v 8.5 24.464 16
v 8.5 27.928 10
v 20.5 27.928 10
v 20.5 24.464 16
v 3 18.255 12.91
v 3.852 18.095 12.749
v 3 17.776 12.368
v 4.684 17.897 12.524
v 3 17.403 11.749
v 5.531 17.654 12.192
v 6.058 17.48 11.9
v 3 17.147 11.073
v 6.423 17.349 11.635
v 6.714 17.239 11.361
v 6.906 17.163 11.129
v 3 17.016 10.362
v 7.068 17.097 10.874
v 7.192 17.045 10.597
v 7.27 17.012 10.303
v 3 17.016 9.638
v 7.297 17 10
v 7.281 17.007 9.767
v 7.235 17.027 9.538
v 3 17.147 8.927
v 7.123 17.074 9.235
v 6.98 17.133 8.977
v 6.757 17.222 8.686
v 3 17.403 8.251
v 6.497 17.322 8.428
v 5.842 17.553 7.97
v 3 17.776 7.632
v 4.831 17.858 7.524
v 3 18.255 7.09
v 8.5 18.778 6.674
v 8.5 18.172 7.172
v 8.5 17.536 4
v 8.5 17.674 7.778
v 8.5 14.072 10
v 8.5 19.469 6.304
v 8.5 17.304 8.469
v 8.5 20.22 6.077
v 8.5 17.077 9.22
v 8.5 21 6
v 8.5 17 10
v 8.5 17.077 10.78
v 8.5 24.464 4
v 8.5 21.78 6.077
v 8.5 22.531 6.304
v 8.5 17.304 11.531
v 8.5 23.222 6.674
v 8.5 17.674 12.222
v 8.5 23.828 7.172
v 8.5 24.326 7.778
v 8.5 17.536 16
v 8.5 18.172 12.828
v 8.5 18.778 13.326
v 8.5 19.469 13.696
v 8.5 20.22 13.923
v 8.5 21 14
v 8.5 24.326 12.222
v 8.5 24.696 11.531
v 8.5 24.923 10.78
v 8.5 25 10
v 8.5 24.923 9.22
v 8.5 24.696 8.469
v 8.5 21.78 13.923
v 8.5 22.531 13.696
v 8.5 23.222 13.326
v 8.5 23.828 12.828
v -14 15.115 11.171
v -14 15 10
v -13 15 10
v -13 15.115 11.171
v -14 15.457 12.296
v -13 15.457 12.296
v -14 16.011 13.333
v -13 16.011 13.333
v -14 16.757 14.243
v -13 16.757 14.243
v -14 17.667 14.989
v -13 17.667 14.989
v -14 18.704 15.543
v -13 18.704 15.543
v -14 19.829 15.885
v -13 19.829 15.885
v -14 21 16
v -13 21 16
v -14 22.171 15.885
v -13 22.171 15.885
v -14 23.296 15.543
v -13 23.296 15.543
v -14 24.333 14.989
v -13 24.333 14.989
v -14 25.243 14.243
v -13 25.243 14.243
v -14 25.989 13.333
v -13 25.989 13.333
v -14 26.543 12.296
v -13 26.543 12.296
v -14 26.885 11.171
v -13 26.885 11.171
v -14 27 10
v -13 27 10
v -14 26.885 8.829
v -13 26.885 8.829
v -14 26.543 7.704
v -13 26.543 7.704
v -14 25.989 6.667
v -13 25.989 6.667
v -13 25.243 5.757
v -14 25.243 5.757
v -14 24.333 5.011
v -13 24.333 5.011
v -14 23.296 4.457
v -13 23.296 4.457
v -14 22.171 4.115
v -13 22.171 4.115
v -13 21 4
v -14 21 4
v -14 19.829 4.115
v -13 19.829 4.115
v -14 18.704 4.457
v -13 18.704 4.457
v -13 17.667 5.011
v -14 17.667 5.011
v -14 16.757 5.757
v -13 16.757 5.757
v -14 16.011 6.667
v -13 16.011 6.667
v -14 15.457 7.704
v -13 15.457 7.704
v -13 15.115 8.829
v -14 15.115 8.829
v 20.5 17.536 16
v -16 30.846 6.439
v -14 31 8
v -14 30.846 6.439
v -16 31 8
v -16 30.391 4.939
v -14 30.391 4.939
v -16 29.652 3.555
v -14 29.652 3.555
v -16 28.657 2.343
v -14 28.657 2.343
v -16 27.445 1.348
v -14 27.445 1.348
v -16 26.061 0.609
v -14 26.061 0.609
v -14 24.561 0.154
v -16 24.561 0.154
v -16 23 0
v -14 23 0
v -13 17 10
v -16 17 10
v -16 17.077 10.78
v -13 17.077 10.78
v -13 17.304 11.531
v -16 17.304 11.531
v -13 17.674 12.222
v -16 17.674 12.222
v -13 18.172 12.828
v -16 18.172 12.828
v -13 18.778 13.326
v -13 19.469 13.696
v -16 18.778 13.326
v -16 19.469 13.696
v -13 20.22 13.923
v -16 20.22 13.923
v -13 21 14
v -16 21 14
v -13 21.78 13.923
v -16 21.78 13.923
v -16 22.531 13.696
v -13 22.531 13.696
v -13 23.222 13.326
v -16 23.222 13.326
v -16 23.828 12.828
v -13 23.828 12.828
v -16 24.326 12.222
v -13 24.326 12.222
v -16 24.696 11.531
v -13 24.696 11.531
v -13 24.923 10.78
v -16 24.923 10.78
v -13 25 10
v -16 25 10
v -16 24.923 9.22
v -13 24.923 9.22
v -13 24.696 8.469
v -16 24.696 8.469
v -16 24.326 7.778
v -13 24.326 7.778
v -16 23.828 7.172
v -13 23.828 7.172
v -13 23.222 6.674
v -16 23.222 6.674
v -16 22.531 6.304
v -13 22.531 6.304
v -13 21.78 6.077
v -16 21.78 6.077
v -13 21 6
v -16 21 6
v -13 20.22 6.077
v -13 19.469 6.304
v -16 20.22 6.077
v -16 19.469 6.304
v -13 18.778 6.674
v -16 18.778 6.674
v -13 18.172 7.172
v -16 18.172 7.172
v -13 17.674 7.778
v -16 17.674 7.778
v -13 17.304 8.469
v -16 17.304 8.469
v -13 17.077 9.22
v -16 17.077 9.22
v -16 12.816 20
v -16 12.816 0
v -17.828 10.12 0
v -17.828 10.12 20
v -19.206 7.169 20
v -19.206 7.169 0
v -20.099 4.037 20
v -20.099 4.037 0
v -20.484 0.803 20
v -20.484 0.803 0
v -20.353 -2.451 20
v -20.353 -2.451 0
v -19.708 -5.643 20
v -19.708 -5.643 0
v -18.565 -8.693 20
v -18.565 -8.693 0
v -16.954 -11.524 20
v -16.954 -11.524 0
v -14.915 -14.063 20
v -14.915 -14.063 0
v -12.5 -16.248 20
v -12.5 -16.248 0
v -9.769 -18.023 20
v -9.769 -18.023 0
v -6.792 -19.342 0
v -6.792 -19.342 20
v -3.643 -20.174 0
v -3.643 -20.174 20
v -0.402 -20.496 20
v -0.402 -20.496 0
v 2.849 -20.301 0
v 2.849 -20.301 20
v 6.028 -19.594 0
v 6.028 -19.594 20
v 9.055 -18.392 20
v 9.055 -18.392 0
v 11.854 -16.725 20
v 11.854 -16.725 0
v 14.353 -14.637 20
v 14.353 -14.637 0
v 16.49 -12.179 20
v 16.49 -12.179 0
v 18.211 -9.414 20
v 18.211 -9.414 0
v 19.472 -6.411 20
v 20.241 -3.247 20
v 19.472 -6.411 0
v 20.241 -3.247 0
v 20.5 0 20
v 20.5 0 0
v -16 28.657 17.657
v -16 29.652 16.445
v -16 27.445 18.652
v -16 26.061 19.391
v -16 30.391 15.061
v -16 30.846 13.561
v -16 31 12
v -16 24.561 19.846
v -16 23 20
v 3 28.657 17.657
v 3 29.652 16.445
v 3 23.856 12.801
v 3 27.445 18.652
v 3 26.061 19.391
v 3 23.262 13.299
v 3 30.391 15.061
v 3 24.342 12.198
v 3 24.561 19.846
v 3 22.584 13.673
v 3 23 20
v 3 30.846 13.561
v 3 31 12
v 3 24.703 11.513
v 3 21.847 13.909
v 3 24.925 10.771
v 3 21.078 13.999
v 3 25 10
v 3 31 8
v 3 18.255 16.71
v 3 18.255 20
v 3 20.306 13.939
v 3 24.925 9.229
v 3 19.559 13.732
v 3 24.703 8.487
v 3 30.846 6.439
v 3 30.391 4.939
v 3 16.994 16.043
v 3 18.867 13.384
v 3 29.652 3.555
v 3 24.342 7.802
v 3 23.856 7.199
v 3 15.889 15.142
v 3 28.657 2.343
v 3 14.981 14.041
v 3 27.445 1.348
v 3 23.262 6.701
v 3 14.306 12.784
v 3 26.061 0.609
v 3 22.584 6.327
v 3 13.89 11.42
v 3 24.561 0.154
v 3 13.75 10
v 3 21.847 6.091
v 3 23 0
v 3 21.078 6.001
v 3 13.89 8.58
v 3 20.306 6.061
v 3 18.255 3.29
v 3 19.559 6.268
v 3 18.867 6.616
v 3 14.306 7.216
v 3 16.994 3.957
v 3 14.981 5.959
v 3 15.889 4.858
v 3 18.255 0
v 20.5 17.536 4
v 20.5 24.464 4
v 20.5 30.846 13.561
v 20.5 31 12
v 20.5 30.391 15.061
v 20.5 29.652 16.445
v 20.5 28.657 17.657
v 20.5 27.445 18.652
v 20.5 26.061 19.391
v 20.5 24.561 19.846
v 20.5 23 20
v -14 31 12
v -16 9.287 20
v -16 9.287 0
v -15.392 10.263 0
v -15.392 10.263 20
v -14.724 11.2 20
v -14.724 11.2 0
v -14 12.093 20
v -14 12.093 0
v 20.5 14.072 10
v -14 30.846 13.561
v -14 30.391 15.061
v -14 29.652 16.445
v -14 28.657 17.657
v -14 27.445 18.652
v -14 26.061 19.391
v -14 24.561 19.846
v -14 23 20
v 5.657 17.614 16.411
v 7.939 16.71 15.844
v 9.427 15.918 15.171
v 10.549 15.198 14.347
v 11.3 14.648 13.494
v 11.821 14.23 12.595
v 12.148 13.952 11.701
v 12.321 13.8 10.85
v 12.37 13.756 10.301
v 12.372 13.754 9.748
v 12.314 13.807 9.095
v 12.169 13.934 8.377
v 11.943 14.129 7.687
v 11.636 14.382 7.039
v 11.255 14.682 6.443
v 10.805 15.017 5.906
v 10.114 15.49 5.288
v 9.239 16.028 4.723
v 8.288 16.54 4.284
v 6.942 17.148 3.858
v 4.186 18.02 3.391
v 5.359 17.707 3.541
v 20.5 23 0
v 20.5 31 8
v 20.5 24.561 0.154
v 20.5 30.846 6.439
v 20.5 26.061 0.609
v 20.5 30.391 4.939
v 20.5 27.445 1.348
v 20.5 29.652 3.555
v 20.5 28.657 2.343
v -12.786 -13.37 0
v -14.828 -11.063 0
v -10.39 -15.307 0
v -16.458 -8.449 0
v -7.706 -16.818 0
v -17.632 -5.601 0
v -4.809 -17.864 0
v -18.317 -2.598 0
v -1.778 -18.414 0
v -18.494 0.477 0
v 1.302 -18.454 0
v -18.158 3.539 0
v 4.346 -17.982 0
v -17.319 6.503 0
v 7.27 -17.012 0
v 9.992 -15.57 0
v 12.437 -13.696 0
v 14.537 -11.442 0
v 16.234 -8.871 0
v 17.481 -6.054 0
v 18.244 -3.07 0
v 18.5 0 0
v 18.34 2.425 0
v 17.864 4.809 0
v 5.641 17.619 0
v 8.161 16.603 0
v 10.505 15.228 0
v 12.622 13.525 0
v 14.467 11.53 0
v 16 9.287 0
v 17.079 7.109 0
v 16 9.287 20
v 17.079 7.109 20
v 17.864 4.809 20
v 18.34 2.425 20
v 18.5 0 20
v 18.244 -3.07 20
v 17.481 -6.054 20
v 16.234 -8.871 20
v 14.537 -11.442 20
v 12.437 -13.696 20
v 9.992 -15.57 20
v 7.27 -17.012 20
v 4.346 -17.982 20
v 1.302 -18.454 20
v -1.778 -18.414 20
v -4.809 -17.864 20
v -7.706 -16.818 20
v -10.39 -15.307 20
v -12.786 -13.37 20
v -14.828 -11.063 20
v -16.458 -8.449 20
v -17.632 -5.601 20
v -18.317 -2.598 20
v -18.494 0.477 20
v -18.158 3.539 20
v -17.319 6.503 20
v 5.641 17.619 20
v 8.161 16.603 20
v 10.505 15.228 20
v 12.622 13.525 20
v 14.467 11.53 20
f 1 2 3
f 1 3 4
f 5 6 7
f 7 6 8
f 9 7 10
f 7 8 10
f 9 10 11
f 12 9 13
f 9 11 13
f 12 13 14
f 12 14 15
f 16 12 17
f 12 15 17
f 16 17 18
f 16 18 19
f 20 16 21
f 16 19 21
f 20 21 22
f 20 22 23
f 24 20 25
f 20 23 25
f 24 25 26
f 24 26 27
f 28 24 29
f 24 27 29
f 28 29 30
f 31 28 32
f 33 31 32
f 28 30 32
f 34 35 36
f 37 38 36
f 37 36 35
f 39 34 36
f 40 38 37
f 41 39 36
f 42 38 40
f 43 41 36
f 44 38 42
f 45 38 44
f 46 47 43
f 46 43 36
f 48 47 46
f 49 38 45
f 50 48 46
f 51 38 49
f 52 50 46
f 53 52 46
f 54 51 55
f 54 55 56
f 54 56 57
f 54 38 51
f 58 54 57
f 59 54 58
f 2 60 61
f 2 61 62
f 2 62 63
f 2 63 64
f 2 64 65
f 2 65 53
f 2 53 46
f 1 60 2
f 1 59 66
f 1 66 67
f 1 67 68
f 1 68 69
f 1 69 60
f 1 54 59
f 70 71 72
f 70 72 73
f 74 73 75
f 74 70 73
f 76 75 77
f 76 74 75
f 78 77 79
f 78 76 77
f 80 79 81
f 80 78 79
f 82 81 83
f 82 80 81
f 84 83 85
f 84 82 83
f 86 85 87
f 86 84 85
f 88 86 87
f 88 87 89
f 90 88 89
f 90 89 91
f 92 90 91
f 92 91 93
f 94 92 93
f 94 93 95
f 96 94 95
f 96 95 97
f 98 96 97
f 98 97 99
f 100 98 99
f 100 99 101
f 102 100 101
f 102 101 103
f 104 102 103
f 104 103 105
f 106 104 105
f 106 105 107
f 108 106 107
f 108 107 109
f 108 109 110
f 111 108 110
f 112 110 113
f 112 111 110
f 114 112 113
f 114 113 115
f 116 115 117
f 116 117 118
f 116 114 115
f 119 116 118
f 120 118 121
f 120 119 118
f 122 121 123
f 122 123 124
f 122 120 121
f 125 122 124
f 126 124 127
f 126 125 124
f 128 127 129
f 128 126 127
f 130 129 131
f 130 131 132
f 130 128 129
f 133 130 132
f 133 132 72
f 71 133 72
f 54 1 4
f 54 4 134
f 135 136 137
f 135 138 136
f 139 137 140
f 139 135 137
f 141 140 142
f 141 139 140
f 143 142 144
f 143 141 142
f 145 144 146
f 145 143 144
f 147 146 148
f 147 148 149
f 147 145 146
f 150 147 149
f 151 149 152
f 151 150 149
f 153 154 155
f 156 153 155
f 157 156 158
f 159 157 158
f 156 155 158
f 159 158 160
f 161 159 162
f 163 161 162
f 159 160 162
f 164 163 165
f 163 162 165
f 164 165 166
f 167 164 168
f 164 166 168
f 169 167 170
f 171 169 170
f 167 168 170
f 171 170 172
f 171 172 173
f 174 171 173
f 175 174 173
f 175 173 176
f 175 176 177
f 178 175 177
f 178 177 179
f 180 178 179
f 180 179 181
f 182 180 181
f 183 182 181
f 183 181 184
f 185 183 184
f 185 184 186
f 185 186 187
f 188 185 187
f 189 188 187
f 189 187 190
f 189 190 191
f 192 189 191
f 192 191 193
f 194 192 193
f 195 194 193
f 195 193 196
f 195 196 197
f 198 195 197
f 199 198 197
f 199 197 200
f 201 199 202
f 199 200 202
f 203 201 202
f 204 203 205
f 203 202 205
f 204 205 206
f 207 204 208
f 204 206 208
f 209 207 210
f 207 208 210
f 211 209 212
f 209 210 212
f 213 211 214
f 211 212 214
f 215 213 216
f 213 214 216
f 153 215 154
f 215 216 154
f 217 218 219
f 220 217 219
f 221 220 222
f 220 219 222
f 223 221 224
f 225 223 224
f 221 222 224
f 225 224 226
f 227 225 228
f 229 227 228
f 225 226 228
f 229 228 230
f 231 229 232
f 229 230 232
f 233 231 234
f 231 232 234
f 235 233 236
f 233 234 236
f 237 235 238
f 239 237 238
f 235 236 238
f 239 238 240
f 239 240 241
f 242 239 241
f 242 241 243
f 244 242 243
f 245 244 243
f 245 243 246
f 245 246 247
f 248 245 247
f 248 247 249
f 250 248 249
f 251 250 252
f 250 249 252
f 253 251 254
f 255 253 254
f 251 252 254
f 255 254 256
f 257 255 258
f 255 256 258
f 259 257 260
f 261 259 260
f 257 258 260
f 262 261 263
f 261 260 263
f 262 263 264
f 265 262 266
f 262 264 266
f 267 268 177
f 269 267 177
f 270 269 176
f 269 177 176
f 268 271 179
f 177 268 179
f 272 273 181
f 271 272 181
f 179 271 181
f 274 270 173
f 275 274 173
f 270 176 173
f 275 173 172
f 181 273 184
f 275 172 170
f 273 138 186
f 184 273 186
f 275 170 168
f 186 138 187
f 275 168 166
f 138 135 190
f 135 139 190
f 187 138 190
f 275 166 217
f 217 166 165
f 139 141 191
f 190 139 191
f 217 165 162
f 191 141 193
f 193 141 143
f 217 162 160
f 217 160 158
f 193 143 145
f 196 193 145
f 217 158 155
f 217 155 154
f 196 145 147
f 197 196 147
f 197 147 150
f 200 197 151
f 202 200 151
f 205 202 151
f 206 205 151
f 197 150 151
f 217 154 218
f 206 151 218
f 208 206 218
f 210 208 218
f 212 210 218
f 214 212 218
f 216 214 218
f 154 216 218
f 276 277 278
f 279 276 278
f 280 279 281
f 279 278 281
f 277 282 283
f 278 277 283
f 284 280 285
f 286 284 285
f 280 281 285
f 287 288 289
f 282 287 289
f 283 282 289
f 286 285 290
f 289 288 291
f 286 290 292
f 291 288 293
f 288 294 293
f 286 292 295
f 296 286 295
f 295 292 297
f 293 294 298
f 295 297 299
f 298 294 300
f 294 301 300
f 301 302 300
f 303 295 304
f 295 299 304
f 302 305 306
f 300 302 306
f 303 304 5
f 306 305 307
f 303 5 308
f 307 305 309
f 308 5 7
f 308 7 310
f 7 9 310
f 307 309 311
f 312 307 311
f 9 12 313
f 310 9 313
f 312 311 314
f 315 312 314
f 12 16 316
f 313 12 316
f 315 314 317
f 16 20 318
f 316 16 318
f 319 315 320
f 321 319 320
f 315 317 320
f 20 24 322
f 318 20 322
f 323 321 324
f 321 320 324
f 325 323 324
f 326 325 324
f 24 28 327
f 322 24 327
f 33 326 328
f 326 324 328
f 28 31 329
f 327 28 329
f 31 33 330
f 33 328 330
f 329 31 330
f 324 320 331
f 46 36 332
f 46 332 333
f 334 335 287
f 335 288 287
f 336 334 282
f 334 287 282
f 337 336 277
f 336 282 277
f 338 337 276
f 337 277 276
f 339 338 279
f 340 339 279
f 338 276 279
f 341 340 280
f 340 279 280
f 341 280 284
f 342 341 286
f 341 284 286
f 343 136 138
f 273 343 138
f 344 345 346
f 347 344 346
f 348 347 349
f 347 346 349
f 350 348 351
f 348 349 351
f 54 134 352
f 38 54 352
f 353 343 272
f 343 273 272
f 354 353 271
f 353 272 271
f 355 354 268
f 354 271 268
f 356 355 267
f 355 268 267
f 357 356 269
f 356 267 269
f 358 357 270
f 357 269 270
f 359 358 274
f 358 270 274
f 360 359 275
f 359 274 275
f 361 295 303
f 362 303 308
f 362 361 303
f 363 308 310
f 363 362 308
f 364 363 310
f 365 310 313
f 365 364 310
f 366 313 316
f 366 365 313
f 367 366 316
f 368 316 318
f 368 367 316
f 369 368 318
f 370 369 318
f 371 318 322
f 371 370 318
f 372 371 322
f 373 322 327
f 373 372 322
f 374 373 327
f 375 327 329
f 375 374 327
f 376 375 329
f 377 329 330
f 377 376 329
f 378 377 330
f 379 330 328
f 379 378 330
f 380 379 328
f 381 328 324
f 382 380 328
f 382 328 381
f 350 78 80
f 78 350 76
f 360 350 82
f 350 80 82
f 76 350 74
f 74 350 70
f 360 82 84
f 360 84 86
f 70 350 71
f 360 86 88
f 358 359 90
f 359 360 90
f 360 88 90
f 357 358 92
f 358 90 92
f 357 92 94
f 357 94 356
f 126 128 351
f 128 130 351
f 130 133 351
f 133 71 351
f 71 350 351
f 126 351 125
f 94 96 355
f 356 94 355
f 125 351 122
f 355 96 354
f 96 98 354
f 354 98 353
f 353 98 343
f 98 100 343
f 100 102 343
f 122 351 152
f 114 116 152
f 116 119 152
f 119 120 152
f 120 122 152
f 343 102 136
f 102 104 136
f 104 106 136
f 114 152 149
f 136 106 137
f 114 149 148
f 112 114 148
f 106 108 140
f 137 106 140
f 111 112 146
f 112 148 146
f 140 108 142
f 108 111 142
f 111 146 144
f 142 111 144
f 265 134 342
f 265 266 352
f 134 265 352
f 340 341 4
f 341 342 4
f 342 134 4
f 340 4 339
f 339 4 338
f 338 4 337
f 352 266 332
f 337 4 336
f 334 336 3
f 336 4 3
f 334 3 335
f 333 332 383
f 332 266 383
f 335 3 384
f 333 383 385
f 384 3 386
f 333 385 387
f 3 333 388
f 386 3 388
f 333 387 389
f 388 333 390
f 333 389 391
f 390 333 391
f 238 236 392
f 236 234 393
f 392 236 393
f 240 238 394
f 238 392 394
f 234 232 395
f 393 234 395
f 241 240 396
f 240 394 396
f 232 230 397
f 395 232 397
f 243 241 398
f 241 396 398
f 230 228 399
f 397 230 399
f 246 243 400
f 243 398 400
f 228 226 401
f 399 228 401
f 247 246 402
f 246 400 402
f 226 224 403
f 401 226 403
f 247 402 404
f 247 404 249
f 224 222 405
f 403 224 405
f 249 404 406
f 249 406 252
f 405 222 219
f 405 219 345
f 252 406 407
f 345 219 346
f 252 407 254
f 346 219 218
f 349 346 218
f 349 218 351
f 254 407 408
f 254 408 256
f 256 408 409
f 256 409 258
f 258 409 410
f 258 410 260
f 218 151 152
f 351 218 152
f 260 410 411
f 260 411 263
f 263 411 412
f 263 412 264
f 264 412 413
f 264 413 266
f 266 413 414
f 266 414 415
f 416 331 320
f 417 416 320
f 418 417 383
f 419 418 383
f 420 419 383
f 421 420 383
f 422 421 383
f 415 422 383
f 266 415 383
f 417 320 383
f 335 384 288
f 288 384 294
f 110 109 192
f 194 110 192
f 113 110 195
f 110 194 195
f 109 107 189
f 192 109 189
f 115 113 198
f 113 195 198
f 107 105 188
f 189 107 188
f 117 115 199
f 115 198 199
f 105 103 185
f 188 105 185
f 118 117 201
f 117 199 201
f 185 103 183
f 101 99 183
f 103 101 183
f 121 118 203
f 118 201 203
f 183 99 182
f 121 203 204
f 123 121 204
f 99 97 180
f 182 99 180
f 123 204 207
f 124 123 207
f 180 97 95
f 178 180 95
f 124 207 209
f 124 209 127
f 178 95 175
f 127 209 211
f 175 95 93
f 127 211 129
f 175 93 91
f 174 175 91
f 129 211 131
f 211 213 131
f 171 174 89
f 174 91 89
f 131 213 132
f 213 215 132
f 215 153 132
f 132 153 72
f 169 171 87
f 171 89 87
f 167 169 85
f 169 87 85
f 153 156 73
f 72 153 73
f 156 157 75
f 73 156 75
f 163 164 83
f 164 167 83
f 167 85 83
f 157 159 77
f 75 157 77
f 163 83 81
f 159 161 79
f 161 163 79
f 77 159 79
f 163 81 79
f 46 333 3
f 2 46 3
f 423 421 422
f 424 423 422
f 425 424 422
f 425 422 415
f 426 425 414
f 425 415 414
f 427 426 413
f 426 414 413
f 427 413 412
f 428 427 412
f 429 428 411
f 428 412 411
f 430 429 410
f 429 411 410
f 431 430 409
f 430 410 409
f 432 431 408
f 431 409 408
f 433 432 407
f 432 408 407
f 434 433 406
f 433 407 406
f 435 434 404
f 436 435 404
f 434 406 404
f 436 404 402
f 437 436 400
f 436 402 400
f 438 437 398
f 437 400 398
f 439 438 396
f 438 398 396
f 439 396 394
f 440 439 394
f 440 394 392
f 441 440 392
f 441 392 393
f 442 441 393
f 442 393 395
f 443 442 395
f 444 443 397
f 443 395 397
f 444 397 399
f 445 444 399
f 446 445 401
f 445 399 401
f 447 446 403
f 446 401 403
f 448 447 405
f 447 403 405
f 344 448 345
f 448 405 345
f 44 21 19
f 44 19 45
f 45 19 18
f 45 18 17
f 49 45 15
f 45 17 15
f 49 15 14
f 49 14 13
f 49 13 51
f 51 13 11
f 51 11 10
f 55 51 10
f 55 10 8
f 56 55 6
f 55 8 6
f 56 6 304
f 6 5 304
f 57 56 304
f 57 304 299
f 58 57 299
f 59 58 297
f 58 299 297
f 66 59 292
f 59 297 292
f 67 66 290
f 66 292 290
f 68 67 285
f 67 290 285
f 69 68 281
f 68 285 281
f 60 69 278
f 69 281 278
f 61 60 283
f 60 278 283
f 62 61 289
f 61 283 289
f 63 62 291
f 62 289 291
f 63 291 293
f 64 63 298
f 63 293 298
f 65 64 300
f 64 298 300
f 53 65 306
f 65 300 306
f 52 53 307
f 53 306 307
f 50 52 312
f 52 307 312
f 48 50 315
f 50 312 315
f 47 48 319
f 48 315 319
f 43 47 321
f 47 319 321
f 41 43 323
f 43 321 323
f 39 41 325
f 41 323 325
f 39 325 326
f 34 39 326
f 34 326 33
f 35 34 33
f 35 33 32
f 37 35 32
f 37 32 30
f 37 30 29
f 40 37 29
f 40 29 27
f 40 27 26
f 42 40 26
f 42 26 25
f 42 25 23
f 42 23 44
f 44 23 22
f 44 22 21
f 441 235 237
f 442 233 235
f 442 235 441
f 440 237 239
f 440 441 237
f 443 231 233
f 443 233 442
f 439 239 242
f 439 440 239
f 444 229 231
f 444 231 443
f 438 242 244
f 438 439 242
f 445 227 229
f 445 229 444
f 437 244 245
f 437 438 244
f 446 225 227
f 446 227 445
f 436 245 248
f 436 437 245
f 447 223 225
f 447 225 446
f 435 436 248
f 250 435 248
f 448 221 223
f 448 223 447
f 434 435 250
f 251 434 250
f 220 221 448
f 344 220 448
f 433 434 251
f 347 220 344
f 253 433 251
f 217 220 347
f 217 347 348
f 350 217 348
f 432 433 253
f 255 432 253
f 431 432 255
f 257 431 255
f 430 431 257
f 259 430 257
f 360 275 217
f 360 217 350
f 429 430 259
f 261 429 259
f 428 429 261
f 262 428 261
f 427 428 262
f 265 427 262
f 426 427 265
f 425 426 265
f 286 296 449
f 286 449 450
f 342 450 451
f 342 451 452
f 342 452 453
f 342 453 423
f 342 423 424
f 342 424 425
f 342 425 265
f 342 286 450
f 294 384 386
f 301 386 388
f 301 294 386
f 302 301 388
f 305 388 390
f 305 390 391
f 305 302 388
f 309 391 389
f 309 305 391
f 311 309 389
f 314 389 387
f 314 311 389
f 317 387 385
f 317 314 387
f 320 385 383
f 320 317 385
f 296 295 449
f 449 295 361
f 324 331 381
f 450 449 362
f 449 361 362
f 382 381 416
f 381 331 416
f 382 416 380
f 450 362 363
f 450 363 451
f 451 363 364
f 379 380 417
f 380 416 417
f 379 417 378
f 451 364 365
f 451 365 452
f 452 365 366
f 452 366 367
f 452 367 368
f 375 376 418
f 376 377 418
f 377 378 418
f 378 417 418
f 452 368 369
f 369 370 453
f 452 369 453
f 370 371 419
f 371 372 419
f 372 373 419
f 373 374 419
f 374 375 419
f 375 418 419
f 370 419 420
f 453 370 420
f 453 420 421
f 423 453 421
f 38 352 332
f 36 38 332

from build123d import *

# Parameters (mm, degrees)
F1_DEPTH = 20
F2_R     = 4
F3_DEPTH = 40
F2_R_2   = 6
F4_DEPTH = 3
F5_R     = 7.25
F5_R_2   = 4
F6_DEPTH = 17.5
F7_DEPTH = 12
F8_R     = 8


# Not quite as in the source:
# - a feature names something its author has since deleted; it is built from what else it names


with BuildPart() as f1:
    # F0 (on Top) → F1 (new body)
    with BuildSketch(Plane.XY):
        with BuildLine():
            Line((20.5, 0), (18.5, 0))
            ThreePointArc((18.5, 0), (-4.8088460154, -17.8640700849), (-16, 9.2870878105))
            Line((-16, 9.2870878105), (-16, 12.816005618))
            ThreePointArc((-16, 12.816005618), (-6.7915388536, -19.3423111339), (20.5, 0))
        make_face()
        with BuildLine():
            Line((-16, 31), (-16, 12.816005618))
            ThreePointArc((-16, 12.816005618), (-15.0387928923, 13.9314287976), (-14, 14.9749791319))
            Line((-14, 14.9749791319), (-14, 31))
            Line((-14, 31), (-16, 31))
        make_face()
        with BuildLine():
            Line((-16, 12.816005618), (-16, 9.2870878105))
            ThreePointArc((-16, 9.2870878105), (-15.0654846671, 10.7369069915), (-14, 12.0933866224))
            Line((-14, 12.0933866224), (-14, 14.9749791319))
            ThreePointArc((-14, 14.9749791319), (-15.0387928923, 13.9314287976), (-16, 12.816005618))
        make_face()
        with BuildLine():
            ThreePointArc((16, 12.816005618), (19.3423111339, 6.7915388536), (20.5, 0))
            Line((20.5, 0), (20.5, 31))
            Line((20.5, 31), (16, 31))
            Line((16, 31), (16, 12.816005618))
        make_face()
        with BuildLine():
            ThreePointArc((16, 9.2870878105), (17.8640700849, 4.8088460154), (18.5, 0))
            Line((18.5, 0), (20.5, 0))
            ThreePointArc((20.5, 0), (19.3423111339, 6.7915388536), (16, 12.816005618))
            Line((16, 12.816005618), (16, 9.2870878105))
        make_face()
        with BuildLine():
            ThreePointArc((3, 20.2792997907), (10.2066248083, 17.7784929064), (16, 12.816005618))
            Line((16, 12.816005618), (16, 31))
            Line((16, 31), (3, 31))
            Line((3, 31), (3, 20.2792997907))
        make_face()
        with BuildLine():
            ThreePointArc((3, 18.2551362635), (10.5050689319, 15.2280506545), (16, 9.2870878105))
            Line((16, 9.2870878105), (16, 12.816005618))
            ThreePointArc((16, 12.816005618), (10.2066248083, 17.7784929064), (3, 20.2792997907))
            Line((3, 20.2792997907), (3, 18.2551362635))
        make_face()
    extrude(amount=F1_DEPTH)

    # F2 (on face) → F3 (cut)
    with BuildSketch(Plane(origin=(-16, 0, 0), x_dir=(0, -1, 0), z_dir=(-1, 0, 0))):
        with Locations((-21, 10)):
            Circle(F2_R)
    extrude(amount=-F3_DEPTH, mode=Mode.SUBTRACT)

    # F2 (on face) → F4 (join)
    with BuildSketch(Plane(origin=(-16, 0, 0), x_dir=(0, -1, 0), z_dir=(-1, 0, 0))):
        with Locations((-21, 10)):
            Circle(F2_R_2)
        with Locations((-21, 10)):
            Circle(F2_R, mode=Mode.SUBTRACT)
    extrude(amount=-F4_DEPTH)

    # F5 (on face) → F6 (join)
    with BuildSketch(Plane.YZ.offset(20.5)):
        with Locations((21, 10)):
            Circle(F5_R)
        Polygon((14.0717967697, 10), (17.5358983849, 16), (24.4641016151, 16), (27.9282032303, 10), (24.4641016151, 4), (17.5358983849, 4), align=None, mode=Mode.SUBTRACT)
        Polygon((24.4641016151, 16), (17.5358983849, 16), (14.0717967697, 10), (17.5358983849, 4), (24.4641016151, 4), (27.9282032303, 10), align=None)
        with Locations((21, 10)):
            Circle(F5_R_2, mode=Mode.SUBTRACT)
    extrude(amount=-F6_DEPTH)

    # F5 (on face) → F7 (cut)
    with BuildSketch(Plane.YZ.offset(20.5)):
        Polygon((24.4641016151, 16), (17.5358983849, 16), (14.0717967697, 10), (17.5358983849, 4), (24.4641016151, 4), (27.9282032303, 10), align=None)
        with Locations((21, 10)):
            Circle(F5_R_2, mode=Mode.SUBTRACT)
    extrude(amount=-F7_DEPTH, mode=Mode.SUBTRACT)

    # F8
    f8_edges = [f1.edges().sort_by_distance(p)[0] for p in [
        (11.75, 31, 20),
        (-15, 31, 20),
        (11.75, 31, 0),
        (-15, 31, 0),
    ]]
    fillet(f8_edges, radius=F8_R)


solid = f1.part
